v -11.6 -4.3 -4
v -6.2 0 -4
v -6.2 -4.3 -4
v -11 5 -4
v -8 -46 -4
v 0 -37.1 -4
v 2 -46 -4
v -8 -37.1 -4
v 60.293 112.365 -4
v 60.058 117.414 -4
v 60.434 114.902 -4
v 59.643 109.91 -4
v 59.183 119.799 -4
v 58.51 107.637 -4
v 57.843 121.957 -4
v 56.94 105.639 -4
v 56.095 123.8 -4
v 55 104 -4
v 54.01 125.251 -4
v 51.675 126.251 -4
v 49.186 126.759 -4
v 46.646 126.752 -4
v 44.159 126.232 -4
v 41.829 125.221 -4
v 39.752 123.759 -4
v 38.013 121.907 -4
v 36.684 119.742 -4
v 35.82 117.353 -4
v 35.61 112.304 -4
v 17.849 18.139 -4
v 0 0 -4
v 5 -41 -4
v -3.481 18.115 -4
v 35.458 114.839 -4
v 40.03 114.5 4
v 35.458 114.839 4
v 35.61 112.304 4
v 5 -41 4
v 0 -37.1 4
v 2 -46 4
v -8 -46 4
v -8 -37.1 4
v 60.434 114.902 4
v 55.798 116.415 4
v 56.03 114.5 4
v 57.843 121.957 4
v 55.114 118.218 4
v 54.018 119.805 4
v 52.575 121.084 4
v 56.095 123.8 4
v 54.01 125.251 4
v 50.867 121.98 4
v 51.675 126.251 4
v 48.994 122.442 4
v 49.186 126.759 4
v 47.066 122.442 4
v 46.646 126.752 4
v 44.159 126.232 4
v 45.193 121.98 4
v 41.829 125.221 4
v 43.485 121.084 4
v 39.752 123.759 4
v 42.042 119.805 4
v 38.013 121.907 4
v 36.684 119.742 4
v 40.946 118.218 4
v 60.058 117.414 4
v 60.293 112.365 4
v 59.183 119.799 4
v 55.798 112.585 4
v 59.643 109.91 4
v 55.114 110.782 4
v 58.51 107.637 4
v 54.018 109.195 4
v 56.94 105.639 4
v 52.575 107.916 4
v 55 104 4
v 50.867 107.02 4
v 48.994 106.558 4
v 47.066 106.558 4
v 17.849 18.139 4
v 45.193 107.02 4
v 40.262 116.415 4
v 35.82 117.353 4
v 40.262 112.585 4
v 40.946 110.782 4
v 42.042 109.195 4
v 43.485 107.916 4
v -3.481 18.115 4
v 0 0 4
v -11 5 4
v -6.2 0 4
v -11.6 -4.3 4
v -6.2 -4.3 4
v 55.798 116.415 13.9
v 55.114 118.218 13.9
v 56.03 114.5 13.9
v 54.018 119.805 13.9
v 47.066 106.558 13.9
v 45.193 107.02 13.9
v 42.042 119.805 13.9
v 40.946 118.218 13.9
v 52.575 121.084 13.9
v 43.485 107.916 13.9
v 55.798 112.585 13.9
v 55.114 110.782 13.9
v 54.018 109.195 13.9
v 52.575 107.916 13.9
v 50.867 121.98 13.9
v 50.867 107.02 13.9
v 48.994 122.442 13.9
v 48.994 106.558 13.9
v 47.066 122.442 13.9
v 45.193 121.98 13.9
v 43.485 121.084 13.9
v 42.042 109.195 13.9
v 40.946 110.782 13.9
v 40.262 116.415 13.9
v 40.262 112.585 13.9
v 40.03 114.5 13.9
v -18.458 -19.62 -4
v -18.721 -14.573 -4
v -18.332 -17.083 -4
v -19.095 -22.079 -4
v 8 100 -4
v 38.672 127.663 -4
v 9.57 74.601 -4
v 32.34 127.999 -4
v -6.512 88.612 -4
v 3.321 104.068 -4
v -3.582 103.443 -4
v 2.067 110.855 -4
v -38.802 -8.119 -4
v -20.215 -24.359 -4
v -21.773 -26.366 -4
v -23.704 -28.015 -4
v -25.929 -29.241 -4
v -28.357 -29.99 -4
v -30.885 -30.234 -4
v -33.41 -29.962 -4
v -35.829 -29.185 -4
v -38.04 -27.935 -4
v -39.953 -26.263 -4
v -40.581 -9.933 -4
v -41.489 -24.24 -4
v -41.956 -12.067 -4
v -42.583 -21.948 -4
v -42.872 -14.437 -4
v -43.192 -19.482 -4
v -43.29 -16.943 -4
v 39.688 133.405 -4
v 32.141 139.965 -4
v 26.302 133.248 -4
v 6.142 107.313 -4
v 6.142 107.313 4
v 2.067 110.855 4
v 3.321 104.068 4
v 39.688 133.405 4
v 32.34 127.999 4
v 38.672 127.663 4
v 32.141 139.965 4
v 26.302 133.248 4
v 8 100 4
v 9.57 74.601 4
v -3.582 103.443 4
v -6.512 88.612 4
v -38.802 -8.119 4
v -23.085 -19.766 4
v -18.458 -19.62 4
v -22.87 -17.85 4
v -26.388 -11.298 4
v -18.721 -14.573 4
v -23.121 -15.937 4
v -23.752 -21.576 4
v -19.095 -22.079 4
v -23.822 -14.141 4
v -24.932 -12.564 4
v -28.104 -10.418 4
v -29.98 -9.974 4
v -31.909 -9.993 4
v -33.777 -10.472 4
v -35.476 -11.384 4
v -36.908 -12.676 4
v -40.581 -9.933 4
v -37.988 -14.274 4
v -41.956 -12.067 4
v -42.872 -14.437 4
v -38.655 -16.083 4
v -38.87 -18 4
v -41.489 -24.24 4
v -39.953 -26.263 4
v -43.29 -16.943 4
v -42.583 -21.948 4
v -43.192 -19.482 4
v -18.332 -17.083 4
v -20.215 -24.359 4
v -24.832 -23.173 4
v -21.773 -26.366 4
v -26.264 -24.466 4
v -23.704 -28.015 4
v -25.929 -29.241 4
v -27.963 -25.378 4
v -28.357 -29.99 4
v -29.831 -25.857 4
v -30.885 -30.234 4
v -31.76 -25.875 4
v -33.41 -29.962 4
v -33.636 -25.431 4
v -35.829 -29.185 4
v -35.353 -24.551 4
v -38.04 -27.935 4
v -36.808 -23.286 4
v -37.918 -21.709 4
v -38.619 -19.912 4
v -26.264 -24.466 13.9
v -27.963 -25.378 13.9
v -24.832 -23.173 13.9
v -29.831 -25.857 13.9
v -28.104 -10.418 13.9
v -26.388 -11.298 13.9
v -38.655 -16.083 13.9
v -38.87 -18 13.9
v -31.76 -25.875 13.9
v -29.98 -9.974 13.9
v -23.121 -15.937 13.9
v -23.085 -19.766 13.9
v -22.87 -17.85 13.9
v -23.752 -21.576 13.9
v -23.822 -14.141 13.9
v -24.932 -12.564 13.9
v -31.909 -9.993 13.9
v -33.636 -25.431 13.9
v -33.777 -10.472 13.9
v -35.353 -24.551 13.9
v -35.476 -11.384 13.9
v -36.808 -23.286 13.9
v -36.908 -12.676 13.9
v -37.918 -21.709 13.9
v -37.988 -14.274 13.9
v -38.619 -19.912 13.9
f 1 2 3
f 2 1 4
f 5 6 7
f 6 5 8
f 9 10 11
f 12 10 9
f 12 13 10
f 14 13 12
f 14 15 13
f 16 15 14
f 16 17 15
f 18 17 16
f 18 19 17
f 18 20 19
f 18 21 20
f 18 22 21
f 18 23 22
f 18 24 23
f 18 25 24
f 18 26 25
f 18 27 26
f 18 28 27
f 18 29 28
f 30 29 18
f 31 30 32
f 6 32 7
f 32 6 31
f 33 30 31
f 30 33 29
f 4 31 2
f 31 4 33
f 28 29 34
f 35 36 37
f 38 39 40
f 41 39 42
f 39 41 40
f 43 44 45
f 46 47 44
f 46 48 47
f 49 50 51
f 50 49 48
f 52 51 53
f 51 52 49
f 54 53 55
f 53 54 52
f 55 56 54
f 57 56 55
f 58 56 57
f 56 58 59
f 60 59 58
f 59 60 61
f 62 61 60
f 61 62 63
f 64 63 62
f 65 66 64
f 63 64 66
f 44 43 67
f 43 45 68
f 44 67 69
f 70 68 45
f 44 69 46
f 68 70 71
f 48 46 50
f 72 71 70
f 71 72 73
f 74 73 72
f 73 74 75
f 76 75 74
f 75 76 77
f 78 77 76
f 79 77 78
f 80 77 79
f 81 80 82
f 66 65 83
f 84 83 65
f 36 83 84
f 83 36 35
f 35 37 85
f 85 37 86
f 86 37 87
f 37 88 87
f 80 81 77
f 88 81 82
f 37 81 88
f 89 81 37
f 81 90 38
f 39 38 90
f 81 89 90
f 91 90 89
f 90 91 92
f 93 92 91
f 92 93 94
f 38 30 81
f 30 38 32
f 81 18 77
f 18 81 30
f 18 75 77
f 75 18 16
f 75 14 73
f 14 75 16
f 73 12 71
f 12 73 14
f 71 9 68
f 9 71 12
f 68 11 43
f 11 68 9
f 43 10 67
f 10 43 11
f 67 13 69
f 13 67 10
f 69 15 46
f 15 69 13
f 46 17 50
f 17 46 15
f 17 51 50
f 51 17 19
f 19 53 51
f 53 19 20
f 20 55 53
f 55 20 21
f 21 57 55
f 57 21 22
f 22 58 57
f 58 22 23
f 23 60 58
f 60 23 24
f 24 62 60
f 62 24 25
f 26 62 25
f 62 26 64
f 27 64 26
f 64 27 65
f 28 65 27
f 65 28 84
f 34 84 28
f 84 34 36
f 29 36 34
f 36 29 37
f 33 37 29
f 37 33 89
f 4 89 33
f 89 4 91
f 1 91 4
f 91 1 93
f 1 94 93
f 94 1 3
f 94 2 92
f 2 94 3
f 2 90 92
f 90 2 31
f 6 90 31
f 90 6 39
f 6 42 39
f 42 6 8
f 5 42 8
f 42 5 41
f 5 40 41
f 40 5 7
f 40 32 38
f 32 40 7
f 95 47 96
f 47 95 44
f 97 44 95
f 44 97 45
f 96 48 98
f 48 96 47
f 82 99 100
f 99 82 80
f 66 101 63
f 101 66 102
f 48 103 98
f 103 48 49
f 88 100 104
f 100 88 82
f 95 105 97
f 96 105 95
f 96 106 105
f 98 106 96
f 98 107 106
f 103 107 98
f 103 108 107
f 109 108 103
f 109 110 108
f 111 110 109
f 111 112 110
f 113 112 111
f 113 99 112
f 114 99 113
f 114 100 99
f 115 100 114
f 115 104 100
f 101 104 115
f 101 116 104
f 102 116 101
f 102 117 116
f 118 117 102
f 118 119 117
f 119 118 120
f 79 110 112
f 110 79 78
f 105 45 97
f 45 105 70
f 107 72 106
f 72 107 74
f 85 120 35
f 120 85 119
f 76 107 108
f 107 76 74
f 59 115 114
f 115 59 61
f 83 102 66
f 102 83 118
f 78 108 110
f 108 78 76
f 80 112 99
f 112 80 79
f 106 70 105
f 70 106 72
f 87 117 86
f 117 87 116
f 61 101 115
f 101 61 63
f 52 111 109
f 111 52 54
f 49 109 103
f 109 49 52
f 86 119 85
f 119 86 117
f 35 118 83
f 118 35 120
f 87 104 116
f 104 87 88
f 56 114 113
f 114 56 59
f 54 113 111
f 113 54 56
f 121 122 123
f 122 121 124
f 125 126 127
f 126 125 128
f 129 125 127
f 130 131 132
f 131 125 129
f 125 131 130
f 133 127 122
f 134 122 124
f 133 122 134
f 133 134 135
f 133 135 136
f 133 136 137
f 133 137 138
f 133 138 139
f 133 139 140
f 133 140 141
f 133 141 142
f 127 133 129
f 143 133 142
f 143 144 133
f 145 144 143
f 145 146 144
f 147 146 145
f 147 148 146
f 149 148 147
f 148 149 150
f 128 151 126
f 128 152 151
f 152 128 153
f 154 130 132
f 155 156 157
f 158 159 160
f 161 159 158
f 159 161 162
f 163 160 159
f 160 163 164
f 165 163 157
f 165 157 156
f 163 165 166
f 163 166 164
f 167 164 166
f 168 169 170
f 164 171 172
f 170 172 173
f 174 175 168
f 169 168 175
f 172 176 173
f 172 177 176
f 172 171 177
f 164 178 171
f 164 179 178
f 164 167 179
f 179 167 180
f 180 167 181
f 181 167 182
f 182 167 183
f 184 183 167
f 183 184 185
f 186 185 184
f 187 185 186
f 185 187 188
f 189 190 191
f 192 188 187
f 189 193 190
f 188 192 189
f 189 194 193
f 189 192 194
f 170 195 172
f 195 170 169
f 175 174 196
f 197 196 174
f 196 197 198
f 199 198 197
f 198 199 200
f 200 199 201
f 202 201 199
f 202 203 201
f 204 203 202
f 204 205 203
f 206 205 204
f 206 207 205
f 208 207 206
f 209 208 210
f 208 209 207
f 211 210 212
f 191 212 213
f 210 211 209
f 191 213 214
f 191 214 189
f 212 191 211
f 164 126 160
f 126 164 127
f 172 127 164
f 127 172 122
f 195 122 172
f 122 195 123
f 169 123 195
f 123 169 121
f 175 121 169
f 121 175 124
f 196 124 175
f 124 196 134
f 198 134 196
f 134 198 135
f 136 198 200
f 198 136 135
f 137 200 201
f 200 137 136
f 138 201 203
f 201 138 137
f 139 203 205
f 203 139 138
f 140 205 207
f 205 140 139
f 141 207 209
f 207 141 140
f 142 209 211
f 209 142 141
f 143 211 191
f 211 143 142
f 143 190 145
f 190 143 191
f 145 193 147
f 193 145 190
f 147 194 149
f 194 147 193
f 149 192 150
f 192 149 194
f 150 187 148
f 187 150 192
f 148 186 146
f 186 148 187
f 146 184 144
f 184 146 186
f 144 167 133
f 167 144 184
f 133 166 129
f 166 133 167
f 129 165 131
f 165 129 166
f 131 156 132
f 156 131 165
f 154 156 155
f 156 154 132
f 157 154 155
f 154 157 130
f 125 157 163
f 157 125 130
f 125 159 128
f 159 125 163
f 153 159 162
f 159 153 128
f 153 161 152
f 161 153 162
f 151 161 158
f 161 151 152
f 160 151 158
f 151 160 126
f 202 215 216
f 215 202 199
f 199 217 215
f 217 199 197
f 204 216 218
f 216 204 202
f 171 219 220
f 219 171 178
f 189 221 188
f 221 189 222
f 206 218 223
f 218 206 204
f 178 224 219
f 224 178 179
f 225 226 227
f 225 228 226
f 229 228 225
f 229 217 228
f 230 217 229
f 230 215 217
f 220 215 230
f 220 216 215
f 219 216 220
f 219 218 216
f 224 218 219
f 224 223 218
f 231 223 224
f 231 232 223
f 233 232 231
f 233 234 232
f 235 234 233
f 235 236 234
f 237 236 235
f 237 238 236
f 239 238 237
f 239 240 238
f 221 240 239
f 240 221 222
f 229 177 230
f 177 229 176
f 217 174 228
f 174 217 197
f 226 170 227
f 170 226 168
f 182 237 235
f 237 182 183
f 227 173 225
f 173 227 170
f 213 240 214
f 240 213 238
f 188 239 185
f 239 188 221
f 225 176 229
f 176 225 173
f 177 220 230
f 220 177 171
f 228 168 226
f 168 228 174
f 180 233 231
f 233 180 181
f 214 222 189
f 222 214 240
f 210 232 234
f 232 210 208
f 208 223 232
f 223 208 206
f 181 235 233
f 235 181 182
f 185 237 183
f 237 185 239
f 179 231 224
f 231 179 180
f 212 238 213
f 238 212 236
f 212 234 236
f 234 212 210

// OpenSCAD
module dxf_holder(){
    linear_extrude(height = 8, center = true, convexity = 5)
        import (file = "spool holdahMK3-37mm.dxf", layer = "0");
}
module spool_holder_left(){
    dxf_holder();
    translate([51.53-3.5,123-5-3.5,3.9])cylinder(h = 10, r=8);
}
module spool_holder_right(){
    mirror([1,0,0])spool_holder_left();
}

translate([8,100,0])rotate([0,0,139])spool_holder_right();

spool_holder_left();
